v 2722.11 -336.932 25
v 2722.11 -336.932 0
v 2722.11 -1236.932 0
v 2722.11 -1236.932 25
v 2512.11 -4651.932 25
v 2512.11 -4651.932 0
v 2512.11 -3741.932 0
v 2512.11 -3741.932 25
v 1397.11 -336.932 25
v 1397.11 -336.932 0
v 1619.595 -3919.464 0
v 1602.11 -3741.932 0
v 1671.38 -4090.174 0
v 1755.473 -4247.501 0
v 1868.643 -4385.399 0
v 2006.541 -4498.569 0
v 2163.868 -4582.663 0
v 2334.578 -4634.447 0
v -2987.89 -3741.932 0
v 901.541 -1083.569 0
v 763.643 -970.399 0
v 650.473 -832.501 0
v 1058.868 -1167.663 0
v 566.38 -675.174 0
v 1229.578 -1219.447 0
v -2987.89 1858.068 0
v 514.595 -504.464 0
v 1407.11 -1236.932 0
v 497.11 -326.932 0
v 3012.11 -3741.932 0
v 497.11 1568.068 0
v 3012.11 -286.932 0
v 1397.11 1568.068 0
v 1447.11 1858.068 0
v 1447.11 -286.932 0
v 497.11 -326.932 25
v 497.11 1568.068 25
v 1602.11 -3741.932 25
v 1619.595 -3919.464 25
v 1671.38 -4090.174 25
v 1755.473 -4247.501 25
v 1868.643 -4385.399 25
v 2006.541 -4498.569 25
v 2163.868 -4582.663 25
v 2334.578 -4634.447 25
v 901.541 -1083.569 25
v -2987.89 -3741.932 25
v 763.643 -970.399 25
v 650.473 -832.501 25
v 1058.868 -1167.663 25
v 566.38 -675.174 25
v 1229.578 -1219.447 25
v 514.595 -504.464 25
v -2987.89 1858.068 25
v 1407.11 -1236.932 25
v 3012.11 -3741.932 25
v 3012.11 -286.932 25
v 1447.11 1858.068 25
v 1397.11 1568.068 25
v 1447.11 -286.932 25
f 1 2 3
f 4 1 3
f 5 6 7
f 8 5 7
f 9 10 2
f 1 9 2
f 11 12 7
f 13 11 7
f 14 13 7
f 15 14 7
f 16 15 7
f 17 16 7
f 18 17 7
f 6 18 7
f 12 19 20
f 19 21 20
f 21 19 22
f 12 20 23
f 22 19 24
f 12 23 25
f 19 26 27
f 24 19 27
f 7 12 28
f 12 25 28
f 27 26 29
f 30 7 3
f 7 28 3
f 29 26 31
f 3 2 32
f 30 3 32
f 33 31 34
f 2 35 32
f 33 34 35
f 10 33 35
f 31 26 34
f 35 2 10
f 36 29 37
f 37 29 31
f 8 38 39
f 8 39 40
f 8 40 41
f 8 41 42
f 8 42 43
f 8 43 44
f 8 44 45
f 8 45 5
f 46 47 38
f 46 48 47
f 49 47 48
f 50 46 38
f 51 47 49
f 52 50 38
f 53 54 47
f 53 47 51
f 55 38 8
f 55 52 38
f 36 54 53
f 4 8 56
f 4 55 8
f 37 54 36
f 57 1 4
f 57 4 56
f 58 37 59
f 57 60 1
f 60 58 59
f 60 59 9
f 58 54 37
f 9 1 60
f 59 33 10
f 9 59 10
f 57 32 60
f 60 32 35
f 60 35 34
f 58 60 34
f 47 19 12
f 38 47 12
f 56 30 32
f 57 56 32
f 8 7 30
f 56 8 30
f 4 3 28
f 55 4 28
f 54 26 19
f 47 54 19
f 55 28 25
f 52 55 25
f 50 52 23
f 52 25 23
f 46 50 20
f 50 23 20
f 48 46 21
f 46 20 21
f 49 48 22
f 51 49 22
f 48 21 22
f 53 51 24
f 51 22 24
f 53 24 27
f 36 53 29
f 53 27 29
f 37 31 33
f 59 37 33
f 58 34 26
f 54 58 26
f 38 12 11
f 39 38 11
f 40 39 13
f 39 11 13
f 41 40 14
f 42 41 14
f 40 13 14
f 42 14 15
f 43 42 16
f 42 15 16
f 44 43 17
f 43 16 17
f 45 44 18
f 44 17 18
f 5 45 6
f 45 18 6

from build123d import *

# Parameters (mm, degrees)
F0_W     = 450
F0_H     = 290
F0_W_2   = 290
F0_H_2   = 400
F1_DEPTH = 25


with BuildPart() as f1:
    # F0 (on Top) → F1 (new body)
    with BuildSketch(Plane.XY):
        with BuildLine():
            Line((497.109995, 1858.067849), (-2987.890005, 1858.067849))
            Line((-2987.890005, 1858.067849), (-2987.890005, -3741.932151))
            Line((-2987.890005, -3741.932151), (1602.109995, -3741.932151))
            ThreePointArc((1602.109995, -3741.932151), (1868.642824, -4385.399322), (2512.109995, -4651.932151))
            Line((2512.109995, -4651.932151), (2512.109995, -3741.932151))
            Line((2512.109995, -3741.932151), (3012.109995, -3741.932151))
            Line((3012.109995, -3741.932151), (3012.109995, -1236.932151))
            Line((3012.109995, -1236.932151), (2722.109995, -1236.932151))
            Line((2722.109995, -1236.932151), (2432.109995, -1236.932151))
            Line((2432.109995, -1236.932151), (2142.109995, -1236.932151))
            Line((2142.109995, -1236.932151), (1852.109995, -1236.932151))
            Line((1852.109995, -1236.932151), (1407.109995, -1236.932151))
            ThreePointArc((1407.109995, -1236.932151), (763.642824, -970.399322), (497.109995, -326.932151))
            Line((497.109995, -326.932151), (497.109995, 118.067849))
            Line((497.109995, 118.067849), (497.109995, 408.067849))
            Line((497.109995, 408.067849), (497.109995, 698.067849))
            Line((497.109995, 698.067849), (497.109995, 988.067849))
            Line((497.109995, 988.067849), (497.109995, 1278.067849))
            Line((497.109995, 1278.067849), (497.109995, 1568.067849))
            Line((497.109995, 1568.067849), (497.109995, 1858.067849))
        make_face()
        with Locations((722.109995, 1713.067849)):
            Rectangle(F0_W, F0_H)
        with Locations((1172.109995, 1713.067849)):
            Rectangle(F0_W, F0_H)
        Polygon((1447.109995, 1858.067849), (1397.109995, 1858.067849), (1397.109995, 1568.067849), (1397.109995, 1278.067849), (1397.109995, 988.067849), (1397.109995, 698.067849), (1397.109995, 408.067849), (1397.109995, 118.067849), (1397.109995, -336.932151), (1852.109995, -336.932151), (2142.109995, -336.932151), (2432.109995, -336.932151), (2722.109995, -336.932151), (3012.109995, -336.932151), (3012.109995, -286.932151), (1447.109995, -286.932151), align=None)
        Polygon((2722.109995, -1236.932151), (3012.109995, -1236.932151), (3012.109995, -786.932151), (3012.109995, -736.932151), (2722.109995, -736.932151), align=None)
        with Locations((2867.109995, -536.932151)):
            Rectangle(F0_W_2, F0_H_2)
    extrude(amount=F1_DEPTH)


solid = f1.part
